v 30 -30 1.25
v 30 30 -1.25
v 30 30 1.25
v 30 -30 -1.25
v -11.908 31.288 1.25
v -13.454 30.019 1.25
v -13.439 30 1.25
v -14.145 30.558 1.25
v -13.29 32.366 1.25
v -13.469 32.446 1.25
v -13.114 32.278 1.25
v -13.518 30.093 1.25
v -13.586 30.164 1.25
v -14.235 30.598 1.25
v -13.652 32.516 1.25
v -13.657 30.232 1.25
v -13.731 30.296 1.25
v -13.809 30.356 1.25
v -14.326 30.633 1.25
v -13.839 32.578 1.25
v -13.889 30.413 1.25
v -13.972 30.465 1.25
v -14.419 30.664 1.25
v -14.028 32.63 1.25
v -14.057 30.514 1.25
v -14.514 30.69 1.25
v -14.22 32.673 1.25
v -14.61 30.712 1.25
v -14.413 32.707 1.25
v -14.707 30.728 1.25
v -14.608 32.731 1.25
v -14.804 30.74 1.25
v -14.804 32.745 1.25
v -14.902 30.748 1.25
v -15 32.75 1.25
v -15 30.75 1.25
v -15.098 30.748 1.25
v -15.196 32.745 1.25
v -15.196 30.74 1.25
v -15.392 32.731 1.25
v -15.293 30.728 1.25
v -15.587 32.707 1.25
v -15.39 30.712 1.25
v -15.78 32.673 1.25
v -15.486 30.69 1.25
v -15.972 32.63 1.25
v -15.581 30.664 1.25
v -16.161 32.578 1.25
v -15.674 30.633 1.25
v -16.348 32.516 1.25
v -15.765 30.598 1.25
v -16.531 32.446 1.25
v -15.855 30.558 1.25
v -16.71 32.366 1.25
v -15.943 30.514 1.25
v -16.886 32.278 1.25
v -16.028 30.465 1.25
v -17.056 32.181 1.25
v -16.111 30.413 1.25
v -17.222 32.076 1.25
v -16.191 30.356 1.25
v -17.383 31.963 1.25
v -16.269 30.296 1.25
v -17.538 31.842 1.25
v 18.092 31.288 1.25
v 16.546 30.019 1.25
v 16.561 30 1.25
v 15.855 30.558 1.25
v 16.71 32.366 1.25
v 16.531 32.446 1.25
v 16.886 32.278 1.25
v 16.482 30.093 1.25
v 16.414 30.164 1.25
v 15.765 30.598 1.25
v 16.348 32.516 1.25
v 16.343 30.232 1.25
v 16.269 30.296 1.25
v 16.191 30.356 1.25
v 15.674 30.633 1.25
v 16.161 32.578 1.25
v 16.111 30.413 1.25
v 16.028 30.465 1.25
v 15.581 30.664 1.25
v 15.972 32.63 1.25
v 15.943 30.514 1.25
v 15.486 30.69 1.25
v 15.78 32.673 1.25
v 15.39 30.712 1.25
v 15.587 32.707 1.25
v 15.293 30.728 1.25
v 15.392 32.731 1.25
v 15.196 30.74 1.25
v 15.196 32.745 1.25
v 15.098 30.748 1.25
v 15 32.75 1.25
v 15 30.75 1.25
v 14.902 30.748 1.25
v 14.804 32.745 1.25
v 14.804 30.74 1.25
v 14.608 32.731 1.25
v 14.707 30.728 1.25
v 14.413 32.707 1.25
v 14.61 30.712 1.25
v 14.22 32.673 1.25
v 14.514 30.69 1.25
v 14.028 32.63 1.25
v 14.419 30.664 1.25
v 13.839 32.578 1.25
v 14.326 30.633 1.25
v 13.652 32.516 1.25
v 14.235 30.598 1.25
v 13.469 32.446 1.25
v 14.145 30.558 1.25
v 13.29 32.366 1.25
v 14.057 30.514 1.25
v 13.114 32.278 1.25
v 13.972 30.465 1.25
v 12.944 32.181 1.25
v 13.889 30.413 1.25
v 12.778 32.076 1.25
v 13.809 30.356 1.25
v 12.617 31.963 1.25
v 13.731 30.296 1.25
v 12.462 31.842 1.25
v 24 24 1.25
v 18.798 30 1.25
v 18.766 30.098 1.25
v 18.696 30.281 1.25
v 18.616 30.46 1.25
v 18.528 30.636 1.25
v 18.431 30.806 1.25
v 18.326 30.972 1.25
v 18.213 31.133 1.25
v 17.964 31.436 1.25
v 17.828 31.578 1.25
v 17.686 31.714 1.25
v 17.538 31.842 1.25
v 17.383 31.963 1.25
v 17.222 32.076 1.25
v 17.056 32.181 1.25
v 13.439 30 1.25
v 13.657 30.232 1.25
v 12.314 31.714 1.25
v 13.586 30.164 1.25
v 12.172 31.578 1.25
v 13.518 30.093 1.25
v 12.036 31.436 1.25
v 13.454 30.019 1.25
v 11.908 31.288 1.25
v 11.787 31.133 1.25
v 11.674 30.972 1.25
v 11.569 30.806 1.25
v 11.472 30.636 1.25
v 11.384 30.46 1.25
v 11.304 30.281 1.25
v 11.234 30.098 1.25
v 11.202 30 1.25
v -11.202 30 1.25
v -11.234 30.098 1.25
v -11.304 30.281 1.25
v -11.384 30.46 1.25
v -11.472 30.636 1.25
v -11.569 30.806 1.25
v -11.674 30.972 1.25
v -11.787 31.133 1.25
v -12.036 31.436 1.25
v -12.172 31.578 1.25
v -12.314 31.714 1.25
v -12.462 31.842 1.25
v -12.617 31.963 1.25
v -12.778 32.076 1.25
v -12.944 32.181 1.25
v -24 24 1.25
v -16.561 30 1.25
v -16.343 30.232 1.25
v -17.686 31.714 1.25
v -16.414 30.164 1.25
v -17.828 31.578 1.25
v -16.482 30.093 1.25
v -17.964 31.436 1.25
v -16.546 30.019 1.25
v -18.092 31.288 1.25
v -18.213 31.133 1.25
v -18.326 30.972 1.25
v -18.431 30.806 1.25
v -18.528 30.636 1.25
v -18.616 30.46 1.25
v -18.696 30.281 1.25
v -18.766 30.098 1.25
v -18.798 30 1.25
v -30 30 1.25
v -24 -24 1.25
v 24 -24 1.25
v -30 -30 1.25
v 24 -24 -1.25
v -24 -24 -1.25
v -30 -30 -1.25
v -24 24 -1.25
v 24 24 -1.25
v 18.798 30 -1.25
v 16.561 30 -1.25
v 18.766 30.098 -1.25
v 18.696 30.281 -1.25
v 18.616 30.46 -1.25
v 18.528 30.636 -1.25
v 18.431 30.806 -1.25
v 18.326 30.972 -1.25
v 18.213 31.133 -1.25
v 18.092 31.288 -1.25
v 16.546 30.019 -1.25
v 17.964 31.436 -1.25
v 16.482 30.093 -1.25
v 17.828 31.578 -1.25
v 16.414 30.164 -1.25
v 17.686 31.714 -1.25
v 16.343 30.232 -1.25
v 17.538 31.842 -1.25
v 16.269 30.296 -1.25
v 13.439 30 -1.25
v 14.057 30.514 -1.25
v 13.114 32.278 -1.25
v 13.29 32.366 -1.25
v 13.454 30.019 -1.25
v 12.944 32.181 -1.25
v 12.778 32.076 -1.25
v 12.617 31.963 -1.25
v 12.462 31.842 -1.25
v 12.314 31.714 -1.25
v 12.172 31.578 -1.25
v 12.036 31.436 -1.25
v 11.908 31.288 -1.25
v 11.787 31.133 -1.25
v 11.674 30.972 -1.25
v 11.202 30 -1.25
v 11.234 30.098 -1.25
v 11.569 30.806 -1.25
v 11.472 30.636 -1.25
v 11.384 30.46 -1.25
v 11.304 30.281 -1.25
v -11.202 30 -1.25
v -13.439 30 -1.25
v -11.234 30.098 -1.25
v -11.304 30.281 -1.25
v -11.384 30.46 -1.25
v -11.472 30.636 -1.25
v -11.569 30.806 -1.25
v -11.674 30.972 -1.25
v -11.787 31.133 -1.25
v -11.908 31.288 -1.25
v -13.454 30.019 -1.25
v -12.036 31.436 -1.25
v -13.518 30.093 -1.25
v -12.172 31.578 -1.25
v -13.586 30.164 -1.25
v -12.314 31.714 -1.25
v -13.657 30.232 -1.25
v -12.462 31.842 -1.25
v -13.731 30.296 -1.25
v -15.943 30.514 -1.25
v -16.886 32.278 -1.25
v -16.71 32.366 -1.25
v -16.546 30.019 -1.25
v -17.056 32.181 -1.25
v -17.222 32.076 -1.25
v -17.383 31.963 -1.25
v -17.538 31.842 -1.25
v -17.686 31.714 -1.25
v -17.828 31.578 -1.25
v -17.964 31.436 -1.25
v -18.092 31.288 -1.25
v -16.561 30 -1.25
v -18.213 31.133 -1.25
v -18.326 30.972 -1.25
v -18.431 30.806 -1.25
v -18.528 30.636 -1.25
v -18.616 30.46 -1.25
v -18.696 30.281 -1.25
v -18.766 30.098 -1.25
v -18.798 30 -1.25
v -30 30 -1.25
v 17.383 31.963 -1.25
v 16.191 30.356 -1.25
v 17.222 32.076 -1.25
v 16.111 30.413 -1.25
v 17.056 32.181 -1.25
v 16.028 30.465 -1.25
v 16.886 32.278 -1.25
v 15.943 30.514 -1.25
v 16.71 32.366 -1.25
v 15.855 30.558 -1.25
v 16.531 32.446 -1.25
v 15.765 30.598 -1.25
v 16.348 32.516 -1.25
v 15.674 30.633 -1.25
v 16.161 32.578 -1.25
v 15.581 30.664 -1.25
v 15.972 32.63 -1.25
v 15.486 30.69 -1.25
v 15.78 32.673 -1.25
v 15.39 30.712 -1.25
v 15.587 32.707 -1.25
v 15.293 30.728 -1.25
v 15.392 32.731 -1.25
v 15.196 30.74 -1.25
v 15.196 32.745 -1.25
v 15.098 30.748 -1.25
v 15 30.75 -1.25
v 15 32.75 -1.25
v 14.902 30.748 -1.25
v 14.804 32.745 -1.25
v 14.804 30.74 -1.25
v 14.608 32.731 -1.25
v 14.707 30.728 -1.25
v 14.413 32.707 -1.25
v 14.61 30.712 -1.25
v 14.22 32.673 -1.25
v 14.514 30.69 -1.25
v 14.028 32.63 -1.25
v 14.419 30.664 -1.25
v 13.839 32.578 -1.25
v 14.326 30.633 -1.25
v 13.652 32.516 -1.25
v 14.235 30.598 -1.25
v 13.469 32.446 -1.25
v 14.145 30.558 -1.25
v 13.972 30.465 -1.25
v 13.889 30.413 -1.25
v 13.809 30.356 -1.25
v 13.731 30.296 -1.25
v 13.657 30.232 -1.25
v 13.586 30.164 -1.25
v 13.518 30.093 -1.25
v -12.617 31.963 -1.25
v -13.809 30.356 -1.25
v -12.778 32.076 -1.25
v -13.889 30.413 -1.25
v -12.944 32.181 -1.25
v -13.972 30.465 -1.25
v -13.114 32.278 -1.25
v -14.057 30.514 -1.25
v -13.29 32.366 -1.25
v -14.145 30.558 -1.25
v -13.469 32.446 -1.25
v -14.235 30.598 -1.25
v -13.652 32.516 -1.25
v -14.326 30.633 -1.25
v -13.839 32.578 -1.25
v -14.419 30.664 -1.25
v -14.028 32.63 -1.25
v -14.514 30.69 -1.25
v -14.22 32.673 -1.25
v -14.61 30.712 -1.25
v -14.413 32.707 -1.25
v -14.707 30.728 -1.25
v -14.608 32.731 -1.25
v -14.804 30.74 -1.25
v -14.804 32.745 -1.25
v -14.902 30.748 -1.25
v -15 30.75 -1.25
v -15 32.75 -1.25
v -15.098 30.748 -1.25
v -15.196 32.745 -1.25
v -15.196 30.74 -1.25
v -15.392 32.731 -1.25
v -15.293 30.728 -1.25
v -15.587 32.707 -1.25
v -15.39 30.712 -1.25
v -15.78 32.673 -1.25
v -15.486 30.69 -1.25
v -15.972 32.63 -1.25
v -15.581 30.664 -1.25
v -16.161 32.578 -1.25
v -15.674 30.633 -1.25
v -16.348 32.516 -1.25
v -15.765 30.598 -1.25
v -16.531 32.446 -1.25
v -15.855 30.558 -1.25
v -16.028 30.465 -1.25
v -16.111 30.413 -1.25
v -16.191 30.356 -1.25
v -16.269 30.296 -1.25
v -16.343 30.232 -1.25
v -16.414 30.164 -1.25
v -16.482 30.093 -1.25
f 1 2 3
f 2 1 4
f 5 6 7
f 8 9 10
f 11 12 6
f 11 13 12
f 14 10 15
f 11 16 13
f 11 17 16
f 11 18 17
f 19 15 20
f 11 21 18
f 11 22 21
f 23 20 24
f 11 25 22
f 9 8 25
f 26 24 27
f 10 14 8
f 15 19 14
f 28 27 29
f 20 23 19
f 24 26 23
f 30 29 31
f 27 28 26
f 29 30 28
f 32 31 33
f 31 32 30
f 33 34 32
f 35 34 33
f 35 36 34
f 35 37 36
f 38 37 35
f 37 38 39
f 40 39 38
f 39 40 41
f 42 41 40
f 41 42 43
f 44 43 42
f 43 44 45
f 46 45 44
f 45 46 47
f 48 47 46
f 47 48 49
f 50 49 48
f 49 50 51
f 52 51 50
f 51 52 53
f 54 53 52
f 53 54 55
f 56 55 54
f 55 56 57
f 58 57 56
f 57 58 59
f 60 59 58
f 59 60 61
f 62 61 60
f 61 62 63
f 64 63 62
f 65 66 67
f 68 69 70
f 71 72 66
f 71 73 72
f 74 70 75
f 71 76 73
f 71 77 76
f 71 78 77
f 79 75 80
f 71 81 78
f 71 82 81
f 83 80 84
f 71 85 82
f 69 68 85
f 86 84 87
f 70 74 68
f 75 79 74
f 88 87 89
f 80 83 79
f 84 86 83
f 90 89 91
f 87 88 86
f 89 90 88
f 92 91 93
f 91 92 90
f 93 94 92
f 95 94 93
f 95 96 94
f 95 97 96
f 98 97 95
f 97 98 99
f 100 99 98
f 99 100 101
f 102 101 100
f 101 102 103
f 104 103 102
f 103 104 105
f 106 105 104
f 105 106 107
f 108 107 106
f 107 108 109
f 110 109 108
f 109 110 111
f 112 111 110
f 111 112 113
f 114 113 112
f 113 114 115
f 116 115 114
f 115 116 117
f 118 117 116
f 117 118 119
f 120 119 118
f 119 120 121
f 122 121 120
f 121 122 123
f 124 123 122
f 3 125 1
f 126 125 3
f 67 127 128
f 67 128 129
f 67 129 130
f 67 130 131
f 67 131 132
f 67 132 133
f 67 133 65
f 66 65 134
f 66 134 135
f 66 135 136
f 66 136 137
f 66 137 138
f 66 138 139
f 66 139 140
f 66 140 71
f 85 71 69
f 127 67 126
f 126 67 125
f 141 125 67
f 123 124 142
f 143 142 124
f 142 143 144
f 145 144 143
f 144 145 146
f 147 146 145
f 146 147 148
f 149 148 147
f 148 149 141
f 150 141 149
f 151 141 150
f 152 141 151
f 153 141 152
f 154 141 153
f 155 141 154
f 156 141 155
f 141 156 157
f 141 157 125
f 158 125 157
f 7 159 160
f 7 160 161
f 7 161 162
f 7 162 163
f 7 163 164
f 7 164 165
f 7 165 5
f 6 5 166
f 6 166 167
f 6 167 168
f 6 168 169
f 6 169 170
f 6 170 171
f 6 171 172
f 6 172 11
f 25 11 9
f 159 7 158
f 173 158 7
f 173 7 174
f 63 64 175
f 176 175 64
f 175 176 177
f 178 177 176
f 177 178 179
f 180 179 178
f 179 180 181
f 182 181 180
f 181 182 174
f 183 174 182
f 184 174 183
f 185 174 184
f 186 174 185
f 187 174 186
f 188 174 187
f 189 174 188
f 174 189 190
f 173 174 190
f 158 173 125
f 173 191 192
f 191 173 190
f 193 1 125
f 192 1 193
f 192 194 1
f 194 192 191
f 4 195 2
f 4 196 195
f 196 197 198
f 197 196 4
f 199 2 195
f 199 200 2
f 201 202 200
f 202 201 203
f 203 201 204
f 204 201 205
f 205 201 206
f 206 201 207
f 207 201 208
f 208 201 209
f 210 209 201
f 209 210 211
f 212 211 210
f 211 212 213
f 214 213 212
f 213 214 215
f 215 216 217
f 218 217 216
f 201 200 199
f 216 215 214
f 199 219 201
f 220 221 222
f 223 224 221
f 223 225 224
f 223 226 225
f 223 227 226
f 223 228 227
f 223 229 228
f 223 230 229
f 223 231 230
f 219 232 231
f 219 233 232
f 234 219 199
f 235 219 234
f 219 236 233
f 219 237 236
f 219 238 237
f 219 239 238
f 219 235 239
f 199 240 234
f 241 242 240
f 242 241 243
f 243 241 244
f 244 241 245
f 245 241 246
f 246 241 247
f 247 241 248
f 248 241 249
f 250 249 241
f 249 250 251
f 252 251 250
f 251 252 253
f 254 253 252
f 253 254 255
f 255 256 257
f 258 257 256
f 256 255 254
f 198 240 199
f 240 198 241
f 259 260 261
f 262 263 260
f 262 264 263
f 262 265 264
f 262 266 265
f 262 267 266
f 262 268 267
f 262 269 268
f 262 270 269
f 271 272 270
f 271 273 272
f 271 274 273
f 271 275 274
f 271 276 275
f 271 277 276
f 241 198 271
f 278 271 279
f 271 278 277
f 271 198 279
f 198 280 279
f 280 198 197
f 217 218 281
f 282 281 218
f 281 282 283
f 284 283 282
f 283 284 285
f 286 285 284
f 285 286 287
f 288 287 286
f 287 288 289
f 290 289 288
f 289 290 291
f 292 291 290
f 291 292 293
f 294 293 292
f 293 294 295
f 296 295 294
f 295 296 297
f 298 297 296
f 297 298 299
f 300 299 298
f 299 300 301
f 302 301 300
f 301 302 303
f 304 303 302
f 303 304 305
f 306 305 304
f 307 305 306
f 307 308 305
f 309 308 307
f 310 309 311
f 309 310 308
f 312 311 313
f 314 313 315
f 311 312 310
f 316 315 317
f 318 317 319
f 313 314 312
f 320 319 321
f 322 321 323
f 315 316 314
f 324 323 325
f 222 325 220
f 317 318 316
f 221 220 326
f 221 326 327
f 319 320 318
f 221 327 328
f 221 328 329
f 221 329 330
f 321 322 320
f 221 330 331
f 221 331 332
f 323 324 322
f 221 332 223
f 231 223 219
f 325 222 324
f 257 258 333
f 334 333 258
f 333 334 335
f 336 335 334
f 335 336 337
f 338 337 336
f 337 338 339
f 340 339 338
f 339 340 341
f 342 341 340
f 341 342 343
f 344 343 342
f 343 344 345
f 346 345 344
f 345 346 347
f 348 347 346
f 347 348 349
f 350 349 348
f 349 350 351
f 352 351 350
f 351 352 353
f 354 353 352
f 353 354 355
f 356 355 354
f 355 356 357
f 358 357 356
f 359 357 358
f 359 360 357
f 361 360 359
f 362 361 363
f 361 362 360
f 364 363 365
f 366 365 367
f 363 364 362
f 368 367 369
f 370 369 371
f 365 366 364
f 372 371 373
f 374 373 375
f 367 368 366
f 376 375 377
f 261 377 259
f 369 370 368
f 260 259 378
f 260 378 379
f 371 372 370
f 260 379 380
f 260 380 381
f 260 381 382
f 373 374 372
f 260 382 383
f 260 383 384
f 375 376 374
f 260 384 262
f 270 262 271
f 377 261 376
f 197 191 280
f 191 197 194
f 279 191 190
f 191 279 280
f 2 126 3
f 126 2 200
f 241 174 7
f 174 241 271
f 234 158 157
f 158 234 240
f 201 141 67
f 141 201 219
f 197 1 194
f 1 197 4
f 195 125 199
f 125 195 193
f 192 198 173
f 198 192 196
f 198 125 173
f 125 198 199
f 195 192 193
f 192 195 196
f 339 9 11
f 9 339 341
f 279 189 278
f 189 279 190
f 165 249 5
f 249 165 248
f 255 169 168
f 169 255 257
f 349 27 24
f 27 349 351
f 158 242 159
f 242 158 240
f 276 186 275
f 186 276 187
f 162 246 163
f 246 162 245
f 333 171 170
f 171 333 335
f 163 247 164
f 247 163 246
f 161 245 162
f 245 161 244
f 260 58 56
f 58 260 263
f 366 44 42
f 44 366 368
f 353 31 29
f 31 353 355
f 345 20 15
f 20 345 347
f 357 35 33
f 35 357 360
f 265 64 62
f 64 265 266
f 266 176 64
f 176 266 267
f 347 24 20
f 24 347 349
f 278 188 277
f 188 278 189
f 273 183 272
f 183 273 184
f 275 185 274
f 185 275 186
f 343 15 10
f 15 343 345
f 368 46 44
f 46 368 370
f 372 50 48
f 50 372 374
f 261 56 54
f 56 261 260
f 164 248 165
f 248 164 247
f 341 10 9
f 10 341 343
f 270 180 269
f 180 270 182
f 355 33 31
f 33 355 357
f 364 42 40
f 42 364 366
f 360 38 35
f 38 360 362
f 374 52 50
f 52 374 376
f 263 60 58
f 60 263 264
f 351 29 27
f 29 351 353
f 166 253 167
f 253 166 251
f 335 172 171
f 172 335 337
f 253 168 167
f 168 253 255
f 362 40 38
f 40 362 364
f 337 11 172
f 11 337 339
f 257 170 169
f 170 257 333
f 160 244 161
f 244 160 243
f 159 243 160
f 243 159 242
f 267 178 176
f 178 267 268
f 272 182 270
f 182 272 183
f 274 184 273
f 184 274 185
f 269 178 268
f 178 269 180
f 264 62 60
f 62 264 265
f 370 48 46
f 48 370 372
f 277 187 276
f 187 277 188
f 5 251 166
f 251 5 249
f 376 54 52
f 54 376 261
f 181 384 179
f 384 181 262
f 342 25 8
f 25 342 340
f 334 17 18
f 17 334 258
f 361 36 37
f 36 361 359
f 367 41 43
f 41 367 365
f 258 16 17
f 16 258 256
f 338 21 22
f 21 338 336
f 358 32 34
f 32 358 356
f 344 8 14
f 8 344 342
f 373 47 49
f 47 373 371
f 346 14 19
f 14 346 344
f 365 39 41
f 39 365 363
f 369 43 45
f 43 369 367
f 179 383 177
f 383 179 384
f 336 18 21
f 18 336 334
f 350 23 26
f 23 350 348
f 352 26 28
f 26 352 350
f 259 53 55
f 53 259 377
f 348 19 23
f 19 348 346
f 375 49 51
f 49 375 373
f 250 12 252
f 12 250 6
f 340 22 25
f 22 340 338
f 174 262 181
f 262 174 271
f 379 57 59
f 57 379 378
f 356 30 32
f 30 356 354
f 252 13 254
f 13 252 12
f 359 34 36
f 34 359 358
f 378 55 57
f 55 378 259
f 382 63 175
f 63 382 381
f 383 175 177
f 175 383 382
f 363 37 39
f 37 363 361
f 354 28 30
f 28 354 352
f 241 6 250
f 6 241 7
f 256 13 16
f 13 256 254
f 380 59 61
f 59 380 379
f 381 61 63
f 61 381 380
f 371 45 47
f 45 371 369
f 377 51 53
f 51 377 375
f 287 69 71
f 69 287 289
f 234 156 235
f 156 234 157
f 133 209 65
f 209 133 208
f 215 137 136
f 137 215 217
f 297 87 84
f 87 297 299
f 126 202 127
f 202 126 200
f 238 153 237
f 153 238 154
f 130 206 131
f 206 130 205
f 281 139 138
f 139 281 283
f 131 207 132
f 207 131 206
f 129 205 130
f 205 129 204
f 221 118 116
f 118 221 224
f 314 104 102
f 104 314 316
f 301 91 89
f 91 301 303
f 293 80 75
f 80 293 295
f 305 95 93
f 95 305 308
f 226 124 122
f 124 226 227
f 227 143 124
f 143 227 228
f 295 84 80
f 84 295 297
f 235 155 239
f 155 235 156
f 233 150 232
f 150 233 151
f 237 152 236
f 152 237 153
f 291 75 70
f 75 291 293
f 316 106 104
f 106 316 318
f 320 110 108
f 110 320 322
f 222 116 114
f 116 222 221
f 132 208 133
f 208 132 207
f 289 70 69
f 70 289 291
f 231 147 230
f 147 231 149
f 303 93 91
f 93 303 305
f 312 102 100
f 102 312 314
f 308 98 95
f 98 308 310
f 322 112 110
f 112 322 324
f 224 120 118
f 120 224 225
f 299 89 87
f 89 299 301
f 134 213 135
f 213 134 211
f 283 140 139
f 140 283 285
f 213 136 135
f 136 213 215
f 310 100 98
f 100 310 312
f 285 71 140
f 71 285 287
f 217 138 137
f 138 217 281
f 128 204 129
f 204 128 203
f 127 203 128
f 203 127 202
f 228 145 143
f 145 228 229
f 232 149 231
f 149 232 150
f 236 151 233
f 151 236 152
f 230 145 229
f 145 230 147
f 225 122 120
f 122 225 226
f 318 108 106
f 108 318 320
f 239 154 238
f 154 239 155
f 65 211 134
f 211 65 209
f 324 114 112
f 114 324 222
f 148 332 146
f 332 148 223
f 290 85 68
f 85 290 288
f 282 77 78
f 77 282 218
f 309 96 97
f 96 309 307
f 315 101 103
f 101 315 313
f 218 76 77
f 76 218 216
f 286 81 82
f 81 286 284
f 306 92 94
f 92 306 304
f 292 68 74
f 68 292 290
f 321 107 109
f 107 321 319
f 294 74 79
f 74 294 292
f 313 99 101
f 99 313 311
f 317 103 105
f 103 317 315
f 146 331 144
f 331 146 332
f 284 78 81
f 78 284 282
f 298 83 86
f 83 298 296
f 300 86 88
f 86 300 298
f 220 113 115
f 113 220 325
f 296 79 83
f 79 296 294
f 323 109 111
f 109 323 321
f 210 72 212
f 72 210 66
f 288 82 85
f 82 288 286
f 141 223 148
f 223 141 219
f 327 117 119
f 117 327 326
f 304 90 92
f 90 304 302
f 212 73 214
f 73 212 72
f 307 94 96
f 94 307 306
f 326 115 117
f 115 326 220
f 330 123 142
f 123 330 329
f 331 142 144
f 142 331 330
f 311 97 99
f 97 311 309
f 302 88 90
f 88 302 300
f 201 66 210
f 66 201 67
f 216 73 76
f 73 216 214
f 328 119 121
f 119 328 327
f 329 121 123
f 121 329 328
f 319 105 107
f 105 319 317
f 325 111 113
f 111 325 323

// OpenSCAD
// Set $fn to 32 for preview, 128 for final render.
$fn = $preview ? 32 : 128;

render_delta = 1;

frame_width_total = 60;
frame_height = 60;
frame_thickness = 2.5;
frame_edge_width = 6;
hanger_distance_from_center = frame_width_total/4;
center_width = frame_width_total - frame_edge_width*2;
center_height = frame_height - frame_edge_width*2;
hole_radius = 2;
hole_distance_from_center = 40;

module hanging_frame(
    frame_width_total,
    frame_height,
    frame_thickness,
    frame_edge_width,
    hanger_distance_from_center,
    center_width,
    center_height,
    hole_radius,
    hole_distance_from_center
) {
    // Calculate half dimensions for easier positioning
    hfw = frame_width_total / 2;
    hfh = frame_height / 2;
    hcw = center_width / 2;
    hch = center_height / 2;
    
    difference() {
        // Main frame
        cube([frame_width_total, frame_height, frame_thickness], center=true);
        
        // Center cutout
        translate([0, 0, -render_delta/10])
            cube([center_width, center_height, frame_thickness + render_delta], center=true);
        
    }
    
    // Hanger protrusions - flat hollow cylinders on top edge
    for(x = [-1, 1]) {
        translate([x * hanger_distance_from_center, hfh - frame_thickness/2, 0]) {
            difference() {
                // Outer cylinder
                cylinder(h=frame_thickness, r=hole_radius * 2, center=true);
                // Inner hole
                cylinder(h=frame_thickness + render_delta, r=hole_radius, center=true);
            }
        }
    }
}

hanging_frame(
    frame_width_total, 
    frame_height, 
    frame_thickness, 
    frame_edge_width, 
    hanger_distance_from_center, 
    center_width, 
    center_height, 
    hole_radius, 
    hole_distance_from_center
);
